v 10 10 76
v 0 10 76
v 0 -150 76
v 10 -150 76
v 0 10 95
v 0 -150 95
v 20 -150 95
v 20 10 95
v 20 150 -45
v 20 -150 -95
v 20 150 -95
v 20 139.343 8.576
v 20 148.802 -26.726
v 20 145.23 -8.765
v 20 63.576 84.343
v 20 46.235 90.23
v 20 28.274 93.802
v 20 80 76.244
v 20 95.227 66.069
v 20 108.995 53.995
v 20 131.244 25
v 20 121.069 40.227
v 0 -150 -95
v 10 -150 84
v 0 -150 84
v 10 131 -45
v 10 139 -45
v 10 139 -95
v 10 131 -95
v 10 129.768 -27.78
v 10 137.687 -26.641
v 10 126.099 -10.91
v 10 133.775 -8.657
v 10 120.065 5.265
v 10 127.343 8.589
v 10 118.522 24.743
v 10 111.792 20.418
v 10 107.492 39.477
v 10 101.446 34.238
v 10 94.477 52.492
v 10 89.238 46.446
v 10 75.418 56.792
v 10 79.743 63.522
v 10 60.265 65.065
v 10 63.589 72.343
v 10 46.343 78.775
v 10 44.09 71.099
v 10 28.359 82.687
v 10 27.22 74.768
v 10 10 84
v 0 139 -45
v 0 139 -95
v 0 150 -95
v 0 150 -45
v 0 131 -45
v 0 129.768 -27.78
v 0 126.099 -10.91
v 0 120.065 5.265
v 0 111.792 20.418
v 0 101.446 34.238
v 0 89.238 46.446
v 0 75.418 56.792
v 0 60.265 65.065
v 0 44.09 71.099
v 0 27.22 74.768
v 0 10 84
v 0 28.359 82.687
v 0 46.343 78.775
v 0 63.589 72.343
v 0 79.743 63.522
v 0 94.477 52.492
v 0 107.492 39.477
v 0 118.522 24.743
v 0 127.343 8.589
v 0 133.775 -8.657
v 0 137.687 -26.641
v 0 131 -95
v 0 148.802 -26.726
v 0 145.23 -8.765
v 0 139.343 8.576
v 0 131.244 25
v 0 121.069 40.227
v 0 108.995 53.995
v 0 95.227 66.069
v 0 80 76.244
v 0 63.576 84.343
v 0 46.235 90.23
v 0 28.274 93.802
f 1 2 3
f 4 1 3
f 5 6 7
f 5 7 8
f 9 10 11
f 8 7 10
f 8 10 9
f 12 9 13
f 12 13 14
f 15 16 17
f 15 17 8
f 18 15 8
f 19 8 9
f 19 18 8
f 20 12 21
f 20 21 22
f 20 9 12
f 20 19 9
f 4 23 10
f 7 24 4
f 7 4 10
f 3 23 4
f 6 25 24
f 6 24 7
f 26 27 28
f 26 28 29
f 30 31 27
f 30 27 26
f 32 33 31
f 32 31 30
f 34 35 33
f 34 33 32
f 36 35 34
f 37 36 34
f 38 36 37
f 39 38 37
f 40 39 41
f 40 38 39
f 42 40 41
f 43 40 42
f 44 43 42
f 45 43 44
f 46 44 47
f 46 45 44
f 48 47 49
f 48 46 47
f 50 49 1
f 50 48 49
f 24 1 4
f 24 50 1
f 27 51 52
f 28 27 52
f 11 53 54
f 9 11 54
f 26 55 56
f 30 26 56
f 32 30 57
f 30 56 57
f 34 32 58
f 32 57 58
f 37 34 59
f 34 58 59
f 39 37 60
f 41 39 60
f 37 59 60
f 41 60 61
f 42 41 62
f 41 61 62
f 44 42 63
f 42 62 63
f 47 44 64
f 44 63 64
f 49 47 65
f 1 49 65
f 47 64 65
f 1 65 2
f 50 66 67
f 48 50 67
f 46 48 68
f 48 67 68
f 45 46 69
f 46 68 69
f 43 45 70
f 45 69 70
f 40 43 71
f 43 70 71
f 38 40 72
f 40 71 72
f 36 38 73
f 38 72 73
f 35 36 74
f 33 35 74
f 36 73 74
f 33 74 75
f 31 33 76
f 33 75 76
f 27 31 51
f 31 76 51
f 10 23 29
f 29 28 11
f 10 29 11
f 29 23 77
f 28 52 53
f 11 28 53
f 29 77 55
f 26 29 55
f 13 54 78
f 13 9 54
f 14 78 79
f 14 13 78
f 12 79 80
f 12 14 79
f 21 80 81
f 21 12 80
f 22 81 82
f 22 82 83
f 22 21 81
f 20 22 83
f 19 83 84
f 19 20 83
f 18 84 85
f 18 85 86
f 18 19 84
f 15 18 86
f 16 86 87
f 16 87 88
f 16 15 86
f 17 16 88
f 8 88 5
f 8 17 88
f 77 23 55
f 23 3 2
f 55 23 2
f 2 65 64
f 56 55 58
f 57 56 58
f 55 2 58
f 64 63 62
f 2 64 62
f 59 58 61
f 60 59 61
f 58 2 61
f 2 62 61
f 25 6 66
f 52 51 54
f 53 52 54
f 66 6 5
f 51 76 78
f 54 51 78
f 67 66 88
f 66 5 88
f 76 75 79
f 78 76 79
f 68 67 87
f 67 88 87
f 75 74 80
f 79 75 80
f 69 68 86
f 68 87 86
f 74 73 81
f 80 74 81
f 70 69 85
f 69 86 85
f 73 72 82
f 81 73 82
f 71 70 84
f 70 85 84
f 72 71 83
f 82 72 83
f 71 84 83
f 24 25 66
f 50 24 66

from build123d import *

# Parameters (mm, degrees)
F0_W     = 300
F0_H     = 190
F1_DEPTH = 20
F2_R     = 140
F4_DEPTH = 10


with BuildPart() as f1:
    # F0 (on Right) → F1 (new body)
    with BuildSketch(Plane.YZ):
        Rectangle(F0_W, F0_H)
    extrude(amount=F1_DEPTH)

    # F2
    f2_edges = [f1.edges().sort_by_distance(p)[0] for p in [
        (10, 150, 95),
    ]]
    fillet(f2_edges, radius=F2_R)

    # F3 (on face) → F4 (cut)
    with BuildSketch(Plane(origin=(0, 0, 0), x_dir=(0, -1, 0), z_dir=(-1, 0, 0))):
        with BuildLine():
            Line((-139, -45), (-139, -95))
            Line((-139, -95), (-131, -95))
            Line((-131, -95), (-131, -45))
            ThreePointArc((-131, -45), (-95.559921, 40.559921), (-10, 76))
            Line((-10, 76), (150, 76))
            Line((150, 76), (150, 84))
            Line((150, 84), (-10, 84))
            ThreePointArc((-10, 84), (-101.216775, 46.216775), (-139, -45))
        make_face()
    extrude(amount=-F4_DEPTH, mode=Mode.SUBTRACT)


solid = f1.part
